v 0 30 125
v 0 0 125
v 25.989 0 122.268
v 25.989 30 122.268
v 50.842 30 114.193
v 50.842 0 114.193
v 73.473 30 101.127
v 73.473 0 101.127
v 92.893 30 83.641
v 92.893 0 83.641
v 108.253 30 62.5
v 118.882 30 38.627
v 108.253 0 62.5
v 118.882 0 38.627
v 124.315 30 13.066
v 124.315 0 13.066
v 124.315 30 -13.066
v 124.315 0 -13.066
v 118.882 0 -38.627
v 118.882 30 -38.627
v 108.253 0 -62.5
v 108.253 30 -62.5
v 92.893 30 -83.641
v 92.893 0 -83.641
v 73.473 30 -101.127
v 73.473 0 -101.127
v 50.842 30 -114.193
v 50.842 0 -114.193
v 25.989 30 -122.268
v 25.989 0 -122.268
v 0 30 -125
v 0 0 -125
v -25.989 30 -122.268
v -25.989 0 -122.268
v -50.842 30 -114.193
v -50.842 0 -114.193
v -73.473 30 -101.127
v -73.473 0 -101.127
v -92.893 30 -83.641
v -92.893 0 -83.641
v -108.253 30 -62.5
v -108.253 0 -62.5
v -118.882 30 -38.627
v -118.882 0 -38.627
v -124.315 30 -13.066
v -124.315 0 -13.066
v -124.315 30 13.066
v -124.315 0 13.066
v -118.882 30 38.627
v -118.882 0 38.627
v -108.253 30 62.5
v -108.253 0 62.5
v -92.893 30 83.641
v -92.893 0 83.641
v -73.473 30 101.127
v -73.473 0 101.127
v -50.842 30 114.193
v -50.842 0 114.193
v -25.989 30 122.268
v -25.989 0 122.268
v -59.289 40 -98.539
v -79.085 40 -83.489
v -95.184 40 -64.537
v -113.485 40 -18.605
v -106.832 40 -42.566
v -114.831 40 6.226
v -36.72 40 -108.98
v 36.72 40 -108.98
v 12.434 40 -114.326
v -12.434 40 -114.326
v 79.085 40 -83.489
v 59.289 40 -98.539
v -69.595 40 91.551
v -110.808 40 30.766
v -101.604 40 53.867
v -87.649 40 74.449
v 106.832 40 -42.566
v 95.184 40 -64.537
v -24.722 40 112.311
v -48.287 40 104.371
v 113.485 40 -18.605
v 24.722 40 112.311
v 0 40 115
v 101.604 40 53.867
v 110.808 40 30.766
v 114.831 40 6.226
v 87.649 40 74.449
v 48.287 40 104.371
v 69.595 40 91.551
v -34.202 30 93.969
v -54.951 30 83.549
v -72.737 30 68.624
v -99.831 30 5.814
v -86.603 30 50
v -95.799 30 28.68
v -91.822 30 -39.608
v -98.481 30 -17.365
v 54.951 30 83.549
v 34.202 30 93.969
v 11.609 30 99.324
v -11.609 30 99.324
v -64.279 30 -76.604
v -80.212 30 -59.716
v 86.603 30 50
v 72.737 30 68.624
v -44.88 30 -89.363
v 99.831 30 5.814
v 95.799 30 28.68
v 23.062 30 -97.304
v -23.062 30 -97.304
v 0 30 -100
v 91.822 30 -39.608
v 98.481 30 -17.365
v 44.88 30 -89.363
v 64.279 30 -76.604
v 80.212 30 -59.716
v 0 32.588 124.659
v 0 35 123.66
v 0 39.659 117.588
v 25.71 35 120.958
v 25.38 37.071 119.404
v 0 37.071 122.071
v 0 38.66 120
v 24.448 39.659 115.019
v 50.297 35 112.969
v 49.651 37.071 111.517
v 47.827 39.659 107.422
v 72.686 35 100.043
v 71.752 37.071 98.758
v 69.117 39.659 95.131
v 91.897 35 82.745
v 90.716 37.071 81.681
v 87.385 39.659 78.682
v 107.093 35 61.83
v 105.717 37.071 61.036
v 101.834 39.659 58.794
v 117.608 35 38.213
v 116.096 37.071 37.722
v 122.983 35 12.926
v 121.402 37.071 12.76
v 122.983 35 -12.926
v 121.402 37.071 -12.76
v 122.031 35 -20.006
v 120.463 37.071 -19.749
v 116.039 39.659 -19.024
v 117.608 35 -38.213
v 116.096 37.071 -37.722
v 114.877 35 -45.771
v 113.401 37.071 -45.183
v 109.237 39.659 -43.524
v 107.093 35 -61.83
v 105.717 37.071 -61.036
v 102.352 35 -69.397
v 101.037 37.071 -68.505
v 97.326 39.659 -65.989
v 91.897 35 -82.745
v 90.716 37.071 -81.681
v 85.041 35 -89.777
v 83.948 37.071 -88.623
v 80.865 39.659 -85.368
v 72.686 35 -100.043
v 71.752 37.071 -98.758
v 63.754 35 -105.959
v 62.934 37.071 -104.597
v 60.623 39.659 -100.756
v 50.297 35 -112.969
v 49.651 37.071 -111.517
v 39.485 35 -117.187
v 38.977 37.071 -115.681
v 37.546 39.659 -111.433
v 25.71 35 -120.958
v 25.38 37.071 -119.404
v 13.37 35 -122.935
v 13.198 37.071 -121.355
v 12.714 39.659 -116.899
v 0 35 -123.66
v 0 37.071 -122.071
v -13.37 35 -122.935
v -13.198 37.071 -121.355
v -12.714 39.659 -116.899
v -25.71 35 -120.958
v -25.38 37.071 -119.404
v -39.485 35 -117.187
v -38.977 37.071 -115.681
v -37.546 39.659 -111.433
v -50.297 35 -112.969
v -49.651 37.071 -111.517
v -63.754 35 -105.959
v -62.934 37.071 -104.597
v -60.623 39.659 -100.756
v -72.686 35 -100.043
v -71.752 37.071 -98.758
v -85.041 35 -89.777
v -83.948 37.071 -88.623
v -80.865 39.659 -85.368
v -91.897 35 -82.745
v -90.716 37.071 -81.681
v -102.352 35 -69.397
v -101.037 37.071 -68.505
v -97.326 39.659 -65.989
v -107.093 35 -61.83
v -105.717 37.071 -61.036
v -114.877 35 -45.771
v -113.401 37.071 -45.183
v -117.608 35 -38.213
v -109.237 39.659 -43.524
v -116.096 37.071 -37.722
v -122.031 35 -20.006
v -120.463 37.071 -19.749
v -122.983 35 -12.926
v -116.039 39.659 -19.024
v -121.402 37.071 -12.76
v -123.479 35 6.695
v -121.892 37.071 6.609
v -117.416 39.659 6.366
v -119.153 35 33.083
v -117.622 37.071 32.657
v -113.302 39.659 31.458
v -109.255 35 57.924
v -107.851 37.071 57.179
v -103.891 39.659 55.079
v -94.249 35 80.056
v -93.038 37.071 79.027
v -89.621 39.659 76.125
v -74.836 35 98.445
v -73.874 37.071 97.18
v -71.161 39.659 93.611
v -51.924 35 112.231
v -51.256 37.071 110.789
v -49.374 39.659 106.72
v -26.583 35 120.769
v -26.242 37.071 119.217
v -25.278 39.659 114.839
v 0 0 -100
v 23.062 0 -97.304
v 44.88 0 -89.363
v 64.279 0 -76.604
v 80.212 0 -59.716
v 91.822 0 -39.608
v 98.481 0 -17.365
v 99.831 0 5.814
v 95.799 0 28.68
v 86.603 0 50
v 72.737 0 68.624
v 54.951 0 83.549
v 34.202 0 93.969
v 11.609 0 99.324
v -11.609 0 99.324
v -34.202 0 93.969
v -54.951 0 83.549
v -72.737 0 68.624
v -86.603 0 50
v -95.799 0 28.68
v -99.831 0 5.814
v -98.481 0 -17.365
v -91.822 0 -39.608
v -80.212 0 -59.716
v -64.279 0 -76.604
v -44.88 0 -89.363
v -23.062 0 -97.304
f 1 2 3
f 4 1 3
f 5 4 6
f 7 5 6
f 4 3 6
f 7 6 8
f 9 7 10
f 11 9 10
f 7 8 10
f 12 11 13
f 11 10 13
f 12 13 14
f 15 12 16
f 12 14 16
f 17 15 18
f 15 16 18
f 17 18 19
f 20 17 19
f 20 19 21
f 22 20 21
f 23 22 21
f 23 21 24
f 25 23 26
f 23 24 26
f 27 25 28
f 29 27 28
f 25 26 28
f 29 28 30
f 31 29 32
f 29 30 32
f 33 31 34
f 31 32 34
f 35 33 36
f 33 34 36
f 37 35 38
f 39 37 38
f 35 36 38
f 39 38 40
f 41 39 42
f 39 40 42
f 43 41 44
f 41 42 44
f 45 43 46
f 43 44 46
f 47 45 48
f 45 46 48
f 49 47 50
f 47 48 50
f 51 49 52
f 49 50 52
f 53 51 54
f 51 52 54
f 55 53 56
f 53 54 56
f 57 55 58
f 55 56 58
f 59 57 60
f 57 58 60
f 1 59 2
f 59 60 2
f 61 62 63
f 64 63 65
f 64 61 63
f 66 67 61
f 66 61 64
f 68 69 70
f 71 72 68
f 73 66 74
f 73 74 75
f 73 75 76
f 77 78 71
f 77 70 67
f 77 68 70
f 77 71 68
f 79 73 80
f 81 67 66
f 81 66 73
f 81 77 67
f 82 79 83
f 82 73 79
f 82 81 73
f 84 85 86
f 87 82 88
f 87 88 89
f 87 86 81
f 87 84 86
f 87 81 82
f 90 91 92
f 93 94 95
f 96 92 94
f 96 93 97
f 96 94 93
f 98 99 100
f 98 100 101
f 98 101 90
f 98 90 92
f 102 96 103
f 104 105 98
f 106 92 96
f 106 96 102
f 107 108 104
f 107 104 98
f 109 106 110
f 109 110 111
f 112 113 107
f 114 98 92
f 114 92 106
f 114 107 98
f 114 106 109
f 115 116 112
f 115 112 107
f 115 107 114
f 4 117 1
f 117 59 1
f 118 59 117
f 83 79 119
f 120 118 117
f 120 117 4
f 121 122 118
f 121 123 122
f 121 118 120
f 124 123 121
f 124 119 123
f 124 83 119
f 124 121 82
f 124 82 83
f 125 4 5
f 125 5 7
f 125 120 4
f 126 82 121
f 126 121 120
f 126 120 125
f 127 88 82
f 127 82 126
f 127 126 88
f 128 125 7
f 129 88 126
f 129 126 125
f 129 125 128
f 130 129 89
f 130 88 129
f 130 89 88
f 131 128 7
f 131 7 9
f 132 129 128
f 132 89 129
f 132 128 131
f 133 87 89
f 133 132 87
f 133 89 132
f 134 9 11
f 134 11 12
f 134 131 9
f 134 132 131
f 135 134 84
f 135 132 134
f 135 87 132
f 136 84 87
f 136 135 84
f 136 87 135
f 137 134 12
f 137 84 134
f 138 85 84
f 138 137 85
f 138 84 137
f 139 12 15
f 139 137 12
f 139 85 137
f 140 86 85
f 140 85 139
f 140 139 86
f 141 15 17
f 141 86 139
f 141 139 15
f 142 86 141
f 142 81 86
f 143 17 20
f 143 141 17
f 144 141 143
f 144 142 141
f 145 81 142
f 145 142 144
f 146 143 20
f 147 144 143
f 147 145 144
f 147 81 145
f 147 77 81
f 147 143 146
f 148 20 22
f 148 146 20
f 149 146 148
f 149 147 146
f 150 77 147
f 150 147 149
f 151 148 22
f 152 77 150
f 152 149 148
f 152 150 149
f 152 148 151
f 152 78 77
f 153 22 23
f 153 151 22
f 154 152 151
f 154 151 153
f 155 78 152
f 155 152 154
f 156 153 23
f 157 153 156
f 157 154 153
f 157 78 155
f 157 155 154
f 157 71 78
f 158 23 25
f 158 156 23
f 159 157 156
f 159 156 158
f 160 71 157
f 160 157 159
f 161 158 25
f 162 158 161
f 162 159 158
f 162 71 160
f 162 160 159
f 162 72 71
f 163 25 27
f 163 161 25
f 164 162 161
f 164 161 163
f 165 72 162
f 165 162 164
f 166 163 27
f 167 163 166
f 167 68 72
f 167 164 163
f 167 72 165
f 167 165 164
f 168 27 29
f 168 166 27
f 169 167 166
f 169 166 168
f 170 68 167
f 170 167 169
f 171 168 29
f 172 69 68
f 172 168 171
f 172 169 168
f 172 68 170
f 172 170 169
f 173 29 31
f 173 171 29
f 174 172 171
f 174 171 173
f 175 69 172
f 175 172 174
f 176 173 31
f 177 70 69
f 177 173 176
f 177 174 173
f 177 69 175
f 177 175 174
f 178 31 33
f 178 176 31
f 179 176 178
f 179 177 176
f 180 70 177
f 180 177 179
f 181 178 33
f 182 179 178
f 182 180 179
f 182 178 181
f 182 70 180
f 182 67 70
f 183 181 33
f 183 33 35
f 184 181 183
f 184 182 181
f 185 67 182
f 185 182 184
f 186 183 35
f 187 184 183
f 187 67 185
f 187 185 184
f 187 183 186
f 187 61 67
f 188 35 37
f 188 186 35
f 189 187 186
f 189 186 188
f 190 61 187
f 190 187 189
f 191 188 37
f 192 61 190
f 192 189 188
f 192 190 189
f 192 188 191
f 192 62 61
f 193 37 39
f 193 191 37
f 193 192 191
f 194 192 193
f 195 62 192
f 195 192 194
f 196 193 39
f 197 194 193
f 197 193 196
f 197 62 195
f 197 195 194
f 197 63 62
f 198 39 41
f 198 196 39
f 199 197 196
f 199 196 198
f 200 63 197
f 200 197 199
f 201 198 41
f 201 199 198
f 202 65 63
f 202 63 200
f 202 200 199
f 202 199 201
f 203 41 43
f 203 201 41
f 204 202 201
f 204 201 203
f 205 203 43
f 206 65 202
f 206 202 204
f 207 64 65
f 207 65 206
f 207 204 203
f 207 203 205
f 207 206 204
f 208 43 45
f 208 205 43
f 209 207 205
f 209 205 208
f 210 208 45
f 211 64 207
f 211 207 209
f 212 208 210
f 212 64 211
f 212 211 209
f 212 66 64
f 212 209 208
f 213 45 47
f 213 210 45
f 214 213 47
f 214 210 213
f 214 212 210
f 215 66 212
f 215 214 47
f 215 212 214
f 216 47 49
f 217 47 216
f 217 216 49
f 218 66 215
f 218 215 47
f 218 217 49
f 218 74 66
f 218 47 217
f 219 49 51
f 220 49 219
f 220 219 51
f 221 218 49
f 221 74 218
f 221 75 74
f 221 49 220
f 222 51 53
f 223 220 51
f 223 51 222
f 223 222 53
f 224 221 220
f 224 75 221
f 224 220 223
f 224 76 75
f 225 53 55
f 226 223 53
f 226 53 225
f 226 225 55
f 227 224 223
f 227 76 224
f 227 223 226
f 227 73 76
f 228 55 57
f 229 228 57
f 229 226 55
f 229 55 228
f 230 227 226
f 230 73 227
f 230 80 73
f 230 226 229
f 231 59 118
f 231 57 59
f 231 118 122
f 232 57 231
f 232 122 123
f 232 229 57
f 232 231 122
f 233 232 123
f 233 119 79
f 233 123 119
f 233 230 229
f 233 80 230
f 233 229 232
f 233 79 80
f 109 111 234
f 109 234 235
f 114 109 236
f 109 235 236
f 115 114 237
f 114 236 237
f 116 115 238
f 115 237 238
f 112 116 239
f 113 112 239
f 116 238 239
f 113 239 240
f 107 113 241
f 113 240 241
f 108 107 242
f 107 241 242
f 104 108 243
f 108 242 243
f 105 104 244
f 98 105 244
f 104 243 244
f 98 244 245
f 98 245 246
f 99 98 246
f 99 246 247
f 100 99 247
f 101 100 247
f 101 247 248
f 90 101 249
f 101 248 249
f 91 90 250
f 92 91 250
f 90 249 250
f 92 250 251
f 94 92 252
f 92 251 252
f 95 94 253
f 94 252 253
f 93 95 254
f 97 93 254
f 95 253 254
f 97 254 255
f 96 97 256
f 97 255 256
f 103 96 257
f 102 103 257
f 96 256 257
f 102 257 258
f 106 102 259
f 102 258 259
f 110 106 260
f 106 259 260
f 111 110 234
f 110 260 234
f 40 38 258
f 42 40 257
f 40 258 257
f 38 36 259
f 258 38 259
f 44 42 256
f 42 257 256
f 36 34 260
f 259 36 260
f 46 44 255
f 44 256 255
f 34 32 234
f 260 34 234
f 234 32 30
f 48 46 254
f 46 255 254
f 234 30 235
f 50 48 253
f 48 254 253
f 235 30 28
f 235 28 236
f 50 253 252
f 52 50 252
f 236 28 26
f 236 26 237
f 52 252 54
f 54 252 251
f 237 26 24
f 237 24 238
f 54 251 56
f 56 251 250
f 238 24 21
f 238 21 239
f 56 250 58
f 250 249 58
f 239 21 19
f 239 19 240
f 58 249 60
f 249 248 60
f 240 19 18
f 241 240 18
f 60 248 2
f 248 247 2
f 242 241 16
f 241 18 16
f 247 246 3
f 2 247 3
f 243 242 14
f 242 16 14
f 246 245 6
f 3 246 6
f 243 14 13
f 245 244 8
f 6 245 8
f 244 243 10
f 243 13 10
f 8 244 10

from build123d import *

# Parameters (mm, degrees)
CROQUIS1_R              = 125
SALIENTE_EXTRUIR1_DEPTH = 40
CROQUIS2_R              = 100
CORTAR_EXTRUIR1_DEPTH   = 30
REDONDEO1_R             = 10


with BuildPart() as part:
    # Croquis1 → Saliente-Extruir1 (new body)
    with BuildSketch(Plane(origin=(0, 0, 0), x_dir=(1, 0, 0), z_dir=(0, 1, 0))):
        with Locations(Location((0, 0, 0), (0, 0, 270))):
            Circle(CROQUIS1_R)
    extrude(amount=SALIENTE_EXTRUIR1_DEPTH)

    # Croquis2 → Cortar-Extruir1 (cut)
    with BuildSketch(Plane.XZ):
        with Locations(Location((0, 0, 0), (0, 0, 270))):
            Circle(CROQUIS2_R)
    extrude(amount=-CORTAR_EXTRUIR1_DEPTH, mode=Mode.SUBTRACT)

    # Redondeo1
    redondeo1_edges = [part.edges().sort_by_distance(p)[0] for p in [
        (0, 40, -125),
    ]]
    fillet(redondeo1_edges, radius=REDONDEO1_R)


solid = part.part
